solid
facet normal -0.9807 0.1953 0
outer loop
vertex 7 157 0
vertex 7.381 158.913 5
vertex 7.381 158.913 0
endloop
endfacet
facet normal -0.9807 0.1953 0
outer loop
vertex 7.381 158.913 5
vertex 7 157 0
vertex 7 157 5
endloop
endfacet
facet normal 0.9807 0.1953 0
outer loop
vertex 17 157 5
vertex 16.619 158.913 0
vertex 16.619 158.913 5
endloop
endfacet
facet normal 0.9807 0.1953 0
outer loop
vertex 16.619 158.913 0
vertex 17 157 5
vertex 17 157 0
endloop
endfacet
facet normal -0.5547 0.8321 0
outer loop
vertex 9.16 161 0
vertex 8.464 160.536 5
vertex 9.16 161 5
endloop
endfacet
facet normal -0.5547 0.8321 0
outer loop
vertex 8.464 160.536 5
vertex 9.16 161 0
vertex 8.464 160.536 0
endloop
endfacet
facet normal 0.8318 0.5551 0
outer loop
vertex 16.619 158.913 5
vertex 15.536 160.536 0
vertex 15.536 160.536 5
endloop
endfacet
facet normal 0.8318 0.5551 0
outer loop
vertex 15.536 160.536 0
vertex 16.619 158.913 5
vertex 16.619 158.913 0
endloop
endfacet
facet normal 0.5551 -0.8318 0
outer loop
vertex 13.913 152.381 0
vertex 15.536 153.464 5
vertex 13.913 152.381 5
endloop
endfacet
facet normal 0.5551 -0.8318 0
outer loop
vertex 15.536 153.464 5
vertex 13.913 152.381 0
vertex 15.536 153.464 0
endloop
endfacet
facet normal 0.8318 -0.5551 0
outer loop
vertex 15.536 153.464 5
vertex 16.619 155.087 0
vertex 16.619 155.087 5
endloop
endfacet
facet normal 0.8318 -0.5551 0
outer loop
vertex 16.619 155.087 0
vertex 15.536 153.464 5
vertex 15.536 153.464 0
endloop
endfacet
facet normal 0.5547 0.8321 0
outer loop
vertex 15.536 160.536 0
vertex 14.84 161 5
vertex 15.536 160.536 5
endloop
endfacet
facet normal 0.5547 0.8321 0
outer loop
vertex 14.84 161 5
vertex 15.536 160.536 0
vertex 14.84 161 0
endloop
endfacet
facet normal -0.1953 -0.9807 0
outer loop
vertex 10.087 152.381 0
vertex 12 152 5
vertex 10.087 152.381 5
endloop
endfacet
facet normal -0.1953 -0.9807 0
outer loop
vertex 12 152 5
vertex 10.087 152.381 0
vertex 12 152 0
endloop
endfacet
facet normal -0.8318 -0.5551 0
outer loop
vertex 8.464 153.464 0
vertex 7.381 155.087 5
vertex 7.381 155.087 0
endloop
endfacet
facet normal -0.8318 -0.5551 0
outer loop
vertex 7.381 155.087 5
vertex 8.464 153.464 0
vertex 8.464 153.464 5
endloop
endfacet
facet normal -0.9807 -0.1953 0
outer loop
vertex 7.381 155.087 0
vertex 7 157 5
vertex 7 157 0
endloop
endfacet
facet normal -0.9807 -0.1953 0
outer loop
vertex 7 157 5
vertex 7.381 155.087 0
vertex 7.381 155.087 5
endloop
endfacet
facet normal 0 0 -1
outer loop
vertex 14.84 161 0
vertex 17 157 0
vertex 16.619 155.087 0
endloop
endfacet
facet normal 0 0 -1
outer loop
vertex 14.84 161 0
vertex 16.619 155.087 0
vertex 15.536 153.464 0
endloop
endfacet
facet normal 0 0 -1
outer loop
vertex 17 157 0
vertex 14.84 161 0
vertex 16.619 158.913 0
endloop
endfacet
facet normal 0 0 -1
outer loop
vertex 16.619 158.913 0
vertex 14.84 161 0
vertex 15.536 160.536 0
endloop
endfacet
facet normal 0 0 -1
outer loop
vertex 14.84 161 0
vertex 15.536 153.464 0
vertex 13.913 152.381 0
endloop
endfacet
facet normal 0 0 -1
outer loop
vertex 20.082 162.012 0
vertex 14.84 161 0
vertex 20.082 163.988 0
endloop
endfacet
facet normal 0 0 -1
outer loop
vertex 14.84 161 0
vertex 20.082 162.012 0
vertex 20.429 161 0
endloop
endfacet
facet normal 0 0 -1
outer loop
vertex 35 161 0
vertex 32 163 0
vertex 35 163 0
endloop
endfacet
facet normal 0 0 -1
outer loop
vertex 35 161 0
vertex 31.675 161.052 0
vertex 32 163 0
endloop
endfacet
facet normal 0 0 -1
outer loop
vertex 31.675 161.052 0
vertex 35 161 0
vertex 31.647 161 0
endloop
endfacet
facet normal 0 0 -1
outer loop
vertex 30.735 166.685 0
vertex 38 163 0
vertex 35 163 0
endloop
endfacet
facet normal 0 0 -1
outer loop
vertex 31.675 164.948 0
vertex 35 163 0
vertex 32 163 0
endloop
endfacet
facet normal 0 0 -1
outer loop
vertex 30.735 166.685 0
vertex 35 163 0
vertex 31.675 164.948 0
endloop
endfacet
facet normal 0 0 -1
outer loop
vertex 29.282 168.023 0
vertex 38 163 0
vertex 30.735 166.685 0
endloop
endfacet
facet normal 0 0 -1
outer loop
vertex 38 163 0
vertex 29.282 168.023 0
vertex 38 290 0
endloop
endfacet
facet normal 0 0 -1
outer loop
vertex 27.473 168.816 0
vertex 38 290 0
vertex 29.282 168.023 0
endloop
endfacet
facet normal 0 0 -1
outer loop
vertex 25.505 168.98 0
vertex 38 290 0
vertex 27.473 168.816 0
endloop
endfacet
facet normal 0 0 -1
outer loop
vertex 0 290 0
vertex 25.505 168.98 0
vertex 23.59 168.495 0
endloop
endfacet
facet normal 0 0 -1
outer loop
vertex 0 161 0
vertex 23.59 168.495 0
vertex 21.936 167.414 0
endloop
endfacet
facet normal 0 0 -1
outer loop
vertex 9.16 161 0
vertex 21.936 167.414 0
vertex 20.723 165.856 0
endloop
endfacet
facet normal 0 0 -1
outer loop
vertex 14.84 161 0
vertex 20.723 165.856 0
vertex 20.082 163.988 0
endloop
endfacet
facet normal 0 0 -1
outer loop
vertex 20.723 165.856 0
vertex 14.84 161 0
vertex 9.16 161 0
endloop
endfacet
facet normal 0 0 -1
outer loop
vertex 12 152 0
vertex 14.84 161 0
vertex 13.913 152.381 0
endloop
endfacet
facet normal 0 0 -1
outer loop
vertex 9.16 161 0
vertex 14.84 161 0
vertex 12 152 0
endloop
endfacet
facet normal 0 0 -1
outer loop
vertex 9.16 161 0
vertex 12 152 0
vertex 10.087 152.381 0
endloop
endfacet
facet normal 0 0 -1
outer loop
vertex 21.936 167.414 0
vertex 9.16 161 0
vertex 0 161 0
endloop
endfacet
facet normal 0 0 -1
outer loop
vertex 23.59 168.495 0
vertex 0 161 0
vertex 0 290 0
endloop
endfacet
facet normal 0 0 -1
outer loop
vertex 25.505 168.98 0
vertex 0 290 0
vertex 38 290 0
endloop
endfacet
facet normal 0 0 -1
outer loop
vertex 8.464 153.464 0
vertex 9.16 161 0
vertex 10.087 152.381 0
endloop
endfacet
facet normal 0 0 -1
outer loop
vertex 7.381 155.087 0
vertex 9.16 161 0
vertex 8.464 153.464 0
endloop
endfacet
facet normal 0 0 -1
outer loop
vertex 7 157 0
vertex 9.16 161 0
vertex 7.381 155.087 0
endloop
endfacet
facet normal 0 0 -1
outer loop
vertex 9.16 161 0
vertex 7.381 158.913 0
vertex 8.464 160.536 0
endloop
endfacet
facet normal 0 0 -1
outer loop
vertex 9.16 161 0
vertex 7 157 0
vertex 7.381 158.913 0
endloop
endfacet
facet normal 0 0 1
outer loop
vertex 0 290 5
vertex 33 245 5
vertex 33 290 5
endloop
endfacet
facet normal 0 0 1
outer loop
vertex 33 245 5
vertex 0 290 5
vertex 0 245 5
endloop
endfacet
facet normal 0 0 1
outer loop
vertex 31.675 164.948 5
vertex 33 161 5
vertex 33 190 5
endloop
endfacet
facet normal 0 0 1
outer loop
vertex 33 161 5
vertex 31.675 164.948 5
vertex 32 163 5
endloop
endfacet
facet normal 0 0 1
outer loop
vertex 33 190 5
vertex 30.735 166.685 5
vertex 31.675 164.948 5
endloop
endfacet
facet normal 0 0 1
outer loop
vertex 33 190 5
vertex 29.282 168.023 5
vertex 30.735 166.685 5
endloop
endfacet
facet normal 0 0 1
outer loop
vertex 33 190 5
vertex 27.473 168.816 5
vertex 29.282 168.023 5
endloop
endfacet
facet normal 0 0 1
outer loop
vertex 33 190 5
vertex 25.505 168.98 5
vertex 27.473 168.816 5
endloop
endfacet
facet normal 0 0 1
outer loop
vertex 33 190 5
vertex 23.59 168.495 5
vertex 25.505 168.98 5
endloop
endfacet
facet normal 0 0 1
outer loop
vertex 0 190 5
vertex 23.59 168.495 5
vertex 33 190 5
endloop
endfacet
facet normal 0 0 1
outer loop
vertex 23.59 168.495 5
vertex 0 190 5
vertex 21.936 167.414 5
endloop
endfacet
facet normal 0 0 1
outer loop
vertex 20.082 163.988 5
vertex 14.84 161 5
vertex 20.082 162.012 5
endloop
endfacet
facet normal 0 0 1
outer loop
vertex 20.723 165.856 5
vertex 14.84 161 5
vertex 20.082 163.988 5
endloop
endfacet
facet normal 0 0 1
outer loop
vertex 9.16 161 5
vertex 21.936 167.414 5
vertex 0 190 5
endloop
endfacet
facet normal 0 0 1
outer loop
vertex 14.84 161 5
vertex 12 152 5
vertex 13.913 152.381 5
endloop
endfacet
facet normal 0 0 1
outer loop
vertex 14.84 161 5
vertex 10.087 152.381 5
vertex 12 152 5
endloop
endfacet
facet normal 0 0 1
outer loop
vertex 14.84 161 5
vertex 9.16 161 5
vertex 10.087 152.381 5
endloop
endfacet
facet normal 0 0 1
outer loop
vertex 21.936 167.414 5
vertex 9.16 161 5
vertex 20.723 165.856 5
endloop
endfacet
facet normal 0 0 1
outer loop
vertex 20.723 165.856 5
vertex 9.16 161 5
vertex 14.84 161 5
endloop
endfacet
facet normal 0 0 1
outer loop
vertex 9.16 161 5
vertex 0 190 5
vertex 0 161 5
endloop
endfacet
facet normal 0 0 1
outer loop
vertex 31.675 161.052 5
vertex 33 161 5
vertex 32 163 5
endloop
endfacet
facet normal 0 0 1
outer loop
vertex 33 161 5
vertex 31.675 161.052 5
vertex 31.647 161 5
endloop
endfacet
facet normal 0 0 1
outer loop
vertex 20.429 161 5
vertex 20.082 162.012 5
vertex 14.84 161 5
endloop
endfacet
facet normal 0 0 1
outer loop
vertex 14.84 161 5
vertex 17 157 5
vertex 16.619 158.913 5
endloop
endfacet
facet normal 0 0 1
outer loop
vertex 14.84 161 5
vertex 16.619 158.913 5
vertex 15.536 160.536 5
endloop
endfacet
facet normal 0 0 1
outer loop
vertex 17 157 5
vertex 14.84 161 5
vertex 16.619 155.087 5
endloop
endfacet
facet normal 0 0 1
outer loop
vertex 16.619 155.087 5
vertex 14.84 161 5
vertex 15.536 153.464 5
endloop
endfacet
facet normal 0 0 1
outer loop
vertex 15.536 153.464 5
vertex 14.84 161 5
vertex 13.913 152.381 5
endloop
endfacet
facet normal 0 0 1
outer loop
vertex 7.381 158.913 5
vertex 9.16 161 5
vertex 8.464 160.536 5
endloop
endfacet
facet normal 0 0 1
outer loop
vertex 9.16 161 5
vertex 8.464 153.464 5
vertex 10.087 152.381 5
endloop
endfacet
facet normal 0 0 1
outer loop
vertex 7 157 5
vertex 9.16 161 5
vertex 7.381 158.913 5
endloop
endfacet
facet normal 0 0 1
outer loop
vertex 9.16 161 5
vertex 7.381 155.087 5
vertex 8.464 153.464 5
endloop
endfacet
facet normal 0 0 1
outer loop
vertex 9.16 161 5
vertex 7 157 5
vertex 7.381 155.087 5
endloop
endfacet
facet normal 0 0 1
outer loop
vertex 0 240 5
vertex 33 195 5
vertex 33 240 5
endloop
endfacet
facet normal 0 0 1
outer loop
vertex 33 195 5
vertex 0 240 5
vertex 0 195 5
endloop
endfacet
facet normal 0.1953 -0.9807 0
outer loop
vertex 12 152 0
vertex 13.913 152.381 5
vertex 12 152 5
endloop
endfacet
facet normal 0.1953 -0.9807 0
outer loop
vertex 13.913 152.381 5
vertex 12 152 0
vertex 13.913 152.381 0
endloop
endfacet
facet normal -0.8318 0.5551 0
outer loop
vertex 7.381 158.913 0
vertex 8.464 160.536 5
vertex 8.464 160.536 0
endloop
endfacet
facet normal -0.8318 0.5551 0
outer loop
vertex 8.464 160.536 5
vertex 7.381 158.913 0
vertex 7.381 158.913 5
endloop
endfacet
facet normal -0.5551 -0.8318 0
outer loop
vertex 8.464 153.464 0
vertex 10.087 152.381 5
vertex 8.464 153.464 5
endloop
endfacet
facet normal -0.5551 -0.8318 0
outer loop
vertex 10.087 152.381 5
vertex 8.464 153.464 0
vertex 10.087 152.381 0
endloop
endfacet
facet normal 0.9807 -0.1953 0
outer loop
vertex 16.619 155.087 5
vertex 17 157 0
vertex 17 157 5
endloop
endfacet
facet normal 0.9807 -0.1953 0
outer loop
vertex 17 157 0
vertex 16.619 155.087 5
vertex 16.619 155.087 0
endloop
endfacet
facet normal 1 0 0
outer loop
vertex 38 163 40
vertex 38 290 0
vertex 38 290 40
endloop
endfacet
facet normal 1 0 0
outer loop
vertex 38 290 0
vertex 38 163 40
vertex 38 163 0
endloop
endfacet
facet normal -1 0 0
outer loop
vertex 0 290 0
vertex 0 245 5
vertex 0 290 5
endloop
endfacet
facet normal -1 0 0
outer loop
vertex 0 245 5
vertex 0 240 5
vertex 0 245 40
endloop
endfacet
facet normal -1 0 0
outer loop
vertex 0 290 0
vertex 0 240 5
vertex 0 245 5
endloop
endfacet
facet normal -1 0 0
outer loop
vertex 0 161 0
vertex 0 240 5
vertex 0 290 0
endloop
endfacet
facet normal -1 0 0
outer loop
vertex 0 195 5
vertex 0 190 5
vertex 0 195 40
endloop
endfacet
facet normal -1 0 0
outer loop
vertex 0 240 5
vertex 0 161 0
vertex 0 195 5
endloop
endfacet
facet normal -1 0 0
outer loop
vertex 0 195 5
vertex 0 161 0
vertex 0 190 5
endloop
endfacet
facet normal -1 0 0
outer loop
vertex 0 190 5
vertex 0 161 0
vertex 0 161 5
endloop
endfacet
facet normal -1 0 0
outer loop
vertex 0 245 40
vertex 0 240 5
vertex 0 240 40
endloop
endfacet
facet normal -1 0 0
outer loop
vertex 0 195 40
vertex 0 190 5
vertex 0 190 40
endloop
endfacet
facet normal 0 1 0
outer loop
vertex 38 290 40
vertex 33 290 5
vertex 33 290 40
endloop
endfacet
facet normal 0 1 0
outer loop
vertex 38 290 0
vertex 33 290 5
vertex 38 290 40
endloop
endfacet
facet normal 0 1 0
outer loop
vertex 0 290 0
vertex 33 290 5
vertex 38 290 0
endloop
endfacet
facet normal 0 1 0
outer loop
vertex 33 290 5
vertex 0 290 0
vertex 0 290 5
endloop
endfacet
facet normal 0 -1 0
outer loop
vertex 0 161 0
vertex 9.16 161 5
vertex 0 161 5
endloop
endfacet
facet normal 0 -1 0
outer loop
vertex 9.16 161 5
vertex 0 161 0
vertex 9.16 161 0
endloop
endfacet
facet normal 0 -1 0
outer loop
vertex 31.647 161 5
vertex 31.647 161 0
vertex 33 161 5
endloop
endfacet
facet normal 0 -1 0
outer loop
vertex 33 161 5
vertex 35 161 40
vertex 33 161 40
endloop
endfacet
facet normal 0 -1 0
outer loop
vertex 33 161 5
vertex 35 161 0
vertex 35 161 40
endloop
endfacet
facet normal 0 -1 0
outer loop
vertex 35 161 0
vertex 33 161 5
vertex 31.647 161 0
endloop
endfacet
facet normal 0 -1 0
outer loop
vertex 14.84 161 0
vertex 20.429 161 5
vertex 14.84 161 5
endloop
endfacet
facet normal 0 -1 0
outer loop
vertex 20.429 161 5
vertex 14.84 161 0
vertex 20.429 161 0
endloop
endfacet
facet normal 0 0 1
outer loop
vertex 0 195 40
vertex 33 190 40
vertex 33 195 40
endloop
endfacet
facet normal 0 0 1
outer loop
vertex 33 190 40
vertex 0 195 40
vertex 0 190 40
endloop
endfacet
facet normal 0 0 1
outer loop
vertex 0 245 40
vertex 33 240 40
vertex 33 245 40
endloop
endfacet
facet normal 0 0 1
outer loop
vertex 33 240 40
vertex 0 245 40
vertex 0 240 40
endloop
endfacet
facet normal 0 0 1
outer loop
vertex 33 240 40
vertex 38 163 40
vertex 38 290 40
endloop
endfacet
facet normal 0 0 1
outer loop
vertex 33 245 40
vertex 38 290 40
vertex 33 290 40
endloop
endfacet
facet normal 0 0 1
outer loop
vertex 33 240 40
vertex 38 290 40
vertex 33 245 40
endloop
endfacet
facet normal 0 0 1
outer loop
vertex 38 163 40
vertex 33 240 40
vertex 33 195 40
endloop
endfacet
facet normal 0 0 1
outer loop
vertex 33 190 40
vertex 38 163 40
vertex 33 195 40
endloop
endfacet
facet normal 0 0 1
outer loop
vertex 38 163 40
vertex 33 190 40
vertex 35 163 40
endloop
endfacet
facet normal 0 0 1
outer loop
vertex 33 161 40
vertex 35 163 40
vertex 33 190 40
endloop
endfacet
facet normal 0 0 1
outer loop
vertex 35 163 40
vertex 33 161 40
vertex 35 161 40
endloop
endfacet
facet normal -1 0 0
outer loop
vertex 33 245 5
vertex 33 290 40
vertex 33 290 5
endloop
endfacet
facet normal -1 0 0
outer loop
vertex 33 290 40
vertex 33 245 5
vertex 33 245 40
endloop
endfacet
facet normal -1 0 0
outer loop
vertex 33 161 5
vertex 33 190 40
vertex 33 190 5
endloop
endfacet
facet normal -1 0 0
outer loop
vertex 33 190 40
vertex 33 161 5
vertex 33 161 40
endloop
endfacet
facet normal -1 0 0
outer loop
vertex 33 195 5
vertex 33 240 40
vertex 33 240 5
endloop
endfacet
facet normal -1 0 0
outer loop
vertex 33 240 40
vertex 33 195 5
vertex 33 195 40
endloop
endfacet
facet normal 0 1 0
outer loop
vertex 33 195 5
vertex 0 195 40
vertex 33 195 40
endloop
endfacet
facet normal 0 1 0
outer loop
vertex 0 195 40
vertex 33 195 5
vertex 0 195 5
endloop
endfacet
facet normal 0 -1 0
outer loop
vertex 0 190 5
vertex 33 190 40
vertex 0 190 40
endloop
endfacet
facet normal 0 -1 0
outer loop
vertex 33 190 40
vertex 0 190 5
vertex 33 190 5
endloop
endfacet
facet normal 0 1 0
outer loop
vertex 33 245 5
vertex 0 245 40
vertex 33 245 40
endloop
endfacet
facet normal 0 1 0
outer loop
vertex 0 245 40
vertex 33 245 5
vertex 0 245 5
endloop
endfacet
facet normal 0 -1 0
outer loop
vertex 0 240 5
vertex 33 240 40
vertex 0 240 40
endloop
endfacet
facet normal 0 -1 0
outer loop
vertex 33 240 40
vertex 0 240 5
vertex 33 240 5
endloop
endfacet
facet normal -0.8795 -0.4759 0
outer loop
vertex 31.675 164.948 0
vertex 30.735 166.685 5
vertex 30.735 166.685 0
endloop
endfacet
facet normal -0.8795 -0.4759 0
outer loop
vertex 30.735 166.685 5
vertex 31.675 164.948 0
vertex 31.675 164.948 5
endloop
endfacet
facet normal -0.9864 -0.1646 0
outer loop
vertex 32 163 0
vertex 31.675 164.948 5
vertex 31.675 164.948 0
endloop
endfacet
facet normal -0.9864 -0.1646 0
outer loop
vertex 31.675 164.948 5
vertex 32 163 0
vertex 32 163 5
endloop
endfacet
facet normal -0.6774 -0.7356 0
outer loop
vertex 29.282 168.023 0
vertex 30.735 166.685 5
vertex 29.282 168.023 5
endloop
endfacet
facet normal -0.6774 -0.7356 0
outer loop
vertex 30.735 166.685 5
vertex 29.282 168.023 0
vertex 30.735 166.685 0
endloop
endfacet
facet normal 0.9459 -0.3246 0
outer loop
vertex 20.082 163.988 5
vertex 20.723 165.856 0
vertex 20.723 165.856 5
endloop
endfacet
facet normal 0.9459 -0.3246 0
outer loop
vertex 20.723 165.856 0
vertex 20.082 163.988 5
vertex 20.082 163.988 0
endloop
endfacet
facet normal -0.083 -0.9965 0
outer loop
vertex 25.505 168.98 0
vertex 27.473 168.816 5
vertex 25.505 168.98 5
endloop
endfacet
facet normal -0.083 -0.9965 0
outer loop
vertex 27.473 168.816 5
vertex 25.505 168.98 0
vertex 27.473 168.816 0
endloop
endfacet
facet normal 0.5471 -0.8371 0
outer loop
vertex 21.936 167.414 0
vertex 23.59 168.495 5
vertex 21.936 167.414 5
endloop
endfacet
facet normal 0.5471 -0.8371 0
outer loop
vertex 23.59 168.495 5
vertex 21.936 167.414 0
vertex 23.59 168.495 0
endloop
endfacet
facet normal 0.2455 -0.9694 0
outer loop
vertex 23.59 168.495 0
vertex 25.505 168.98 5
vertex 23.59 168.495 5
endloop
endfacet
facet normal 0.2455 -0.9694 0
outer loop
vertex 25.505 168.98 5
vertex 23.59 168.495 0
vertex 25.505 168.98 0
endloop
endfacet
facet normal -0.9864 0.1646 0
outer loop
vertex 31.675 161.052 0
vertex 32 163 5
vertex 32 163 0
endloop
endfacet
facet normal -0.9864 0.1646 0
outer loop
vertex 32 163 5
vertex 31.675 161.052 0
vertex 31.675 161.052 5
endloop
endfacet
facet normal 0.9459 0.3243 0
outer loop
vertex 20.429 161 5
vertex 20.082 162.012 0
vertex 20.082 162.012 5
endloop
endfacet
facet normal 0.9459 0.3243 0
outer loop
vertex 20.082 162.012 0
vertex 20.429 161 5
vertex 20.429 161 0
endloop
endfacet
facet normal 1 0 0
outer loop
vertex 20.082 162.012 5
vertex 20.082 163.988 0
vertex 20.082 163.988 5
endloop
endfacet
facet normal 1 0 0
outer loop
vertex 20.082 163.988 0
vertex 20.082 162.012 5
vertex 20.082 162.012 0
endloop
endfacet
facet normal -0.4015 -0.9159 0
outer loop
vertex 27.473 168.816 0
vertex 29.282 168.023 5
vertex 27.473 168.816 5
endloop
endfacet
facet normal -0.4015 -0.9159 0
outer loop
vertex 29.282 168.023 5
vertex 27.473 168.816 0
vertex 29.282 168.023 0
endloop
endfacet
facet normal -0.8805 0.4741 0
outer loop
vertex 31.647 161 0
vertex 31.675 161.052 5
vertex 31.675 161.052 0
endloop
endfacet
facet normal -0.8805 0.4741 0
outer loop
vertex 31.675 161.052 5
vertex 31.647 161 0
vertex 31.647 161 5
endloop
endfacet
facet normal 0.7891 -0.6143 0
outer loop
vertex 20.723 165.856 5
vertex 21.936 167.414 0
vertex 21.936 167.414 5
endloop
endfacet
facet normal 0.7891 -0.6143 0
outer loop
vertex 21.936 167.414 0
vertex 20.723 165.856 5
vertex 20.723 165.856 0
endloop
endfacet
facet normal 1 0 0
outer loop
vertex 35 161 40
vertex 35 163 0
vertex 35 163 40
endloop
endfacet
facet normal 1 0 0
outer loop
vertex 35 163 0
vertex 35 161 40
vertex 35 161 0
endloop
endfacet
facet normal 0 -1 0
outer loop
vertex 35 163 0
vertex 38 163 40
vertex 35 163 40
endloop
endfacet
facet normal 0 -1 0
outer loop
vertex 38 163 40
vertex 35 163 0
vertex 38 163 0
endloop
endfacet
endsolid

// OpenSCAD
module bloc1(){
    difference(){
        union(){
            difference(){
                cube([160,160,5]);
                translate([38,92,-1]) cube([160,160,7]);
            }
            cube([160,5,10]);
            cube([5,160,10]);
            translate([33,87,0]) cube([5,75,40]);
            hull(){
                translate([33,87,0]) cube([5,5,40]);
                translate([155,87,0]) cube([5,5,60]);
            }
            translate([0,87,0]) cube([38,5,40]);
            translate([0,145,0]) cube([38,5,40]);

            translate([163,35,0]) cylinder(h=5,r=5);
            translate([163,75,0]) cylinder(h=5,r=5);
            translate([26,163,0]) cylinder(h=5,r=5);
        }
        translate([157,15,-1]) cylinder(h=7,r=6);
        translate([157,55,-1]) cylinder(h=7,r=6);
        translate([12,157,-1]) cylinder(h=7,r=6);
        translate([157,89,-1]) cube([5,5,122]);
        translate([31,160,-1]) cube([5,5,42]);

    }
}
module bloc2(){
    difference(){
        union(){
            translate([12,157,0]) cylinder(h=5,r=5);
            translate([0,161,0]) cube([38,129,5]);
            translate([33,161,0]) cube([5,129,40]);
            translate([0,190,0]) cube([38,5,40]);
            translate([0,240,0]) cube([38,5,40]);


        }
        translate([26,163,-1]) cylinder(h=7,r=6);
        translate([35,158,-1]) cube([5,5,42]);
    }
}
//bloc1();
bloc2();
